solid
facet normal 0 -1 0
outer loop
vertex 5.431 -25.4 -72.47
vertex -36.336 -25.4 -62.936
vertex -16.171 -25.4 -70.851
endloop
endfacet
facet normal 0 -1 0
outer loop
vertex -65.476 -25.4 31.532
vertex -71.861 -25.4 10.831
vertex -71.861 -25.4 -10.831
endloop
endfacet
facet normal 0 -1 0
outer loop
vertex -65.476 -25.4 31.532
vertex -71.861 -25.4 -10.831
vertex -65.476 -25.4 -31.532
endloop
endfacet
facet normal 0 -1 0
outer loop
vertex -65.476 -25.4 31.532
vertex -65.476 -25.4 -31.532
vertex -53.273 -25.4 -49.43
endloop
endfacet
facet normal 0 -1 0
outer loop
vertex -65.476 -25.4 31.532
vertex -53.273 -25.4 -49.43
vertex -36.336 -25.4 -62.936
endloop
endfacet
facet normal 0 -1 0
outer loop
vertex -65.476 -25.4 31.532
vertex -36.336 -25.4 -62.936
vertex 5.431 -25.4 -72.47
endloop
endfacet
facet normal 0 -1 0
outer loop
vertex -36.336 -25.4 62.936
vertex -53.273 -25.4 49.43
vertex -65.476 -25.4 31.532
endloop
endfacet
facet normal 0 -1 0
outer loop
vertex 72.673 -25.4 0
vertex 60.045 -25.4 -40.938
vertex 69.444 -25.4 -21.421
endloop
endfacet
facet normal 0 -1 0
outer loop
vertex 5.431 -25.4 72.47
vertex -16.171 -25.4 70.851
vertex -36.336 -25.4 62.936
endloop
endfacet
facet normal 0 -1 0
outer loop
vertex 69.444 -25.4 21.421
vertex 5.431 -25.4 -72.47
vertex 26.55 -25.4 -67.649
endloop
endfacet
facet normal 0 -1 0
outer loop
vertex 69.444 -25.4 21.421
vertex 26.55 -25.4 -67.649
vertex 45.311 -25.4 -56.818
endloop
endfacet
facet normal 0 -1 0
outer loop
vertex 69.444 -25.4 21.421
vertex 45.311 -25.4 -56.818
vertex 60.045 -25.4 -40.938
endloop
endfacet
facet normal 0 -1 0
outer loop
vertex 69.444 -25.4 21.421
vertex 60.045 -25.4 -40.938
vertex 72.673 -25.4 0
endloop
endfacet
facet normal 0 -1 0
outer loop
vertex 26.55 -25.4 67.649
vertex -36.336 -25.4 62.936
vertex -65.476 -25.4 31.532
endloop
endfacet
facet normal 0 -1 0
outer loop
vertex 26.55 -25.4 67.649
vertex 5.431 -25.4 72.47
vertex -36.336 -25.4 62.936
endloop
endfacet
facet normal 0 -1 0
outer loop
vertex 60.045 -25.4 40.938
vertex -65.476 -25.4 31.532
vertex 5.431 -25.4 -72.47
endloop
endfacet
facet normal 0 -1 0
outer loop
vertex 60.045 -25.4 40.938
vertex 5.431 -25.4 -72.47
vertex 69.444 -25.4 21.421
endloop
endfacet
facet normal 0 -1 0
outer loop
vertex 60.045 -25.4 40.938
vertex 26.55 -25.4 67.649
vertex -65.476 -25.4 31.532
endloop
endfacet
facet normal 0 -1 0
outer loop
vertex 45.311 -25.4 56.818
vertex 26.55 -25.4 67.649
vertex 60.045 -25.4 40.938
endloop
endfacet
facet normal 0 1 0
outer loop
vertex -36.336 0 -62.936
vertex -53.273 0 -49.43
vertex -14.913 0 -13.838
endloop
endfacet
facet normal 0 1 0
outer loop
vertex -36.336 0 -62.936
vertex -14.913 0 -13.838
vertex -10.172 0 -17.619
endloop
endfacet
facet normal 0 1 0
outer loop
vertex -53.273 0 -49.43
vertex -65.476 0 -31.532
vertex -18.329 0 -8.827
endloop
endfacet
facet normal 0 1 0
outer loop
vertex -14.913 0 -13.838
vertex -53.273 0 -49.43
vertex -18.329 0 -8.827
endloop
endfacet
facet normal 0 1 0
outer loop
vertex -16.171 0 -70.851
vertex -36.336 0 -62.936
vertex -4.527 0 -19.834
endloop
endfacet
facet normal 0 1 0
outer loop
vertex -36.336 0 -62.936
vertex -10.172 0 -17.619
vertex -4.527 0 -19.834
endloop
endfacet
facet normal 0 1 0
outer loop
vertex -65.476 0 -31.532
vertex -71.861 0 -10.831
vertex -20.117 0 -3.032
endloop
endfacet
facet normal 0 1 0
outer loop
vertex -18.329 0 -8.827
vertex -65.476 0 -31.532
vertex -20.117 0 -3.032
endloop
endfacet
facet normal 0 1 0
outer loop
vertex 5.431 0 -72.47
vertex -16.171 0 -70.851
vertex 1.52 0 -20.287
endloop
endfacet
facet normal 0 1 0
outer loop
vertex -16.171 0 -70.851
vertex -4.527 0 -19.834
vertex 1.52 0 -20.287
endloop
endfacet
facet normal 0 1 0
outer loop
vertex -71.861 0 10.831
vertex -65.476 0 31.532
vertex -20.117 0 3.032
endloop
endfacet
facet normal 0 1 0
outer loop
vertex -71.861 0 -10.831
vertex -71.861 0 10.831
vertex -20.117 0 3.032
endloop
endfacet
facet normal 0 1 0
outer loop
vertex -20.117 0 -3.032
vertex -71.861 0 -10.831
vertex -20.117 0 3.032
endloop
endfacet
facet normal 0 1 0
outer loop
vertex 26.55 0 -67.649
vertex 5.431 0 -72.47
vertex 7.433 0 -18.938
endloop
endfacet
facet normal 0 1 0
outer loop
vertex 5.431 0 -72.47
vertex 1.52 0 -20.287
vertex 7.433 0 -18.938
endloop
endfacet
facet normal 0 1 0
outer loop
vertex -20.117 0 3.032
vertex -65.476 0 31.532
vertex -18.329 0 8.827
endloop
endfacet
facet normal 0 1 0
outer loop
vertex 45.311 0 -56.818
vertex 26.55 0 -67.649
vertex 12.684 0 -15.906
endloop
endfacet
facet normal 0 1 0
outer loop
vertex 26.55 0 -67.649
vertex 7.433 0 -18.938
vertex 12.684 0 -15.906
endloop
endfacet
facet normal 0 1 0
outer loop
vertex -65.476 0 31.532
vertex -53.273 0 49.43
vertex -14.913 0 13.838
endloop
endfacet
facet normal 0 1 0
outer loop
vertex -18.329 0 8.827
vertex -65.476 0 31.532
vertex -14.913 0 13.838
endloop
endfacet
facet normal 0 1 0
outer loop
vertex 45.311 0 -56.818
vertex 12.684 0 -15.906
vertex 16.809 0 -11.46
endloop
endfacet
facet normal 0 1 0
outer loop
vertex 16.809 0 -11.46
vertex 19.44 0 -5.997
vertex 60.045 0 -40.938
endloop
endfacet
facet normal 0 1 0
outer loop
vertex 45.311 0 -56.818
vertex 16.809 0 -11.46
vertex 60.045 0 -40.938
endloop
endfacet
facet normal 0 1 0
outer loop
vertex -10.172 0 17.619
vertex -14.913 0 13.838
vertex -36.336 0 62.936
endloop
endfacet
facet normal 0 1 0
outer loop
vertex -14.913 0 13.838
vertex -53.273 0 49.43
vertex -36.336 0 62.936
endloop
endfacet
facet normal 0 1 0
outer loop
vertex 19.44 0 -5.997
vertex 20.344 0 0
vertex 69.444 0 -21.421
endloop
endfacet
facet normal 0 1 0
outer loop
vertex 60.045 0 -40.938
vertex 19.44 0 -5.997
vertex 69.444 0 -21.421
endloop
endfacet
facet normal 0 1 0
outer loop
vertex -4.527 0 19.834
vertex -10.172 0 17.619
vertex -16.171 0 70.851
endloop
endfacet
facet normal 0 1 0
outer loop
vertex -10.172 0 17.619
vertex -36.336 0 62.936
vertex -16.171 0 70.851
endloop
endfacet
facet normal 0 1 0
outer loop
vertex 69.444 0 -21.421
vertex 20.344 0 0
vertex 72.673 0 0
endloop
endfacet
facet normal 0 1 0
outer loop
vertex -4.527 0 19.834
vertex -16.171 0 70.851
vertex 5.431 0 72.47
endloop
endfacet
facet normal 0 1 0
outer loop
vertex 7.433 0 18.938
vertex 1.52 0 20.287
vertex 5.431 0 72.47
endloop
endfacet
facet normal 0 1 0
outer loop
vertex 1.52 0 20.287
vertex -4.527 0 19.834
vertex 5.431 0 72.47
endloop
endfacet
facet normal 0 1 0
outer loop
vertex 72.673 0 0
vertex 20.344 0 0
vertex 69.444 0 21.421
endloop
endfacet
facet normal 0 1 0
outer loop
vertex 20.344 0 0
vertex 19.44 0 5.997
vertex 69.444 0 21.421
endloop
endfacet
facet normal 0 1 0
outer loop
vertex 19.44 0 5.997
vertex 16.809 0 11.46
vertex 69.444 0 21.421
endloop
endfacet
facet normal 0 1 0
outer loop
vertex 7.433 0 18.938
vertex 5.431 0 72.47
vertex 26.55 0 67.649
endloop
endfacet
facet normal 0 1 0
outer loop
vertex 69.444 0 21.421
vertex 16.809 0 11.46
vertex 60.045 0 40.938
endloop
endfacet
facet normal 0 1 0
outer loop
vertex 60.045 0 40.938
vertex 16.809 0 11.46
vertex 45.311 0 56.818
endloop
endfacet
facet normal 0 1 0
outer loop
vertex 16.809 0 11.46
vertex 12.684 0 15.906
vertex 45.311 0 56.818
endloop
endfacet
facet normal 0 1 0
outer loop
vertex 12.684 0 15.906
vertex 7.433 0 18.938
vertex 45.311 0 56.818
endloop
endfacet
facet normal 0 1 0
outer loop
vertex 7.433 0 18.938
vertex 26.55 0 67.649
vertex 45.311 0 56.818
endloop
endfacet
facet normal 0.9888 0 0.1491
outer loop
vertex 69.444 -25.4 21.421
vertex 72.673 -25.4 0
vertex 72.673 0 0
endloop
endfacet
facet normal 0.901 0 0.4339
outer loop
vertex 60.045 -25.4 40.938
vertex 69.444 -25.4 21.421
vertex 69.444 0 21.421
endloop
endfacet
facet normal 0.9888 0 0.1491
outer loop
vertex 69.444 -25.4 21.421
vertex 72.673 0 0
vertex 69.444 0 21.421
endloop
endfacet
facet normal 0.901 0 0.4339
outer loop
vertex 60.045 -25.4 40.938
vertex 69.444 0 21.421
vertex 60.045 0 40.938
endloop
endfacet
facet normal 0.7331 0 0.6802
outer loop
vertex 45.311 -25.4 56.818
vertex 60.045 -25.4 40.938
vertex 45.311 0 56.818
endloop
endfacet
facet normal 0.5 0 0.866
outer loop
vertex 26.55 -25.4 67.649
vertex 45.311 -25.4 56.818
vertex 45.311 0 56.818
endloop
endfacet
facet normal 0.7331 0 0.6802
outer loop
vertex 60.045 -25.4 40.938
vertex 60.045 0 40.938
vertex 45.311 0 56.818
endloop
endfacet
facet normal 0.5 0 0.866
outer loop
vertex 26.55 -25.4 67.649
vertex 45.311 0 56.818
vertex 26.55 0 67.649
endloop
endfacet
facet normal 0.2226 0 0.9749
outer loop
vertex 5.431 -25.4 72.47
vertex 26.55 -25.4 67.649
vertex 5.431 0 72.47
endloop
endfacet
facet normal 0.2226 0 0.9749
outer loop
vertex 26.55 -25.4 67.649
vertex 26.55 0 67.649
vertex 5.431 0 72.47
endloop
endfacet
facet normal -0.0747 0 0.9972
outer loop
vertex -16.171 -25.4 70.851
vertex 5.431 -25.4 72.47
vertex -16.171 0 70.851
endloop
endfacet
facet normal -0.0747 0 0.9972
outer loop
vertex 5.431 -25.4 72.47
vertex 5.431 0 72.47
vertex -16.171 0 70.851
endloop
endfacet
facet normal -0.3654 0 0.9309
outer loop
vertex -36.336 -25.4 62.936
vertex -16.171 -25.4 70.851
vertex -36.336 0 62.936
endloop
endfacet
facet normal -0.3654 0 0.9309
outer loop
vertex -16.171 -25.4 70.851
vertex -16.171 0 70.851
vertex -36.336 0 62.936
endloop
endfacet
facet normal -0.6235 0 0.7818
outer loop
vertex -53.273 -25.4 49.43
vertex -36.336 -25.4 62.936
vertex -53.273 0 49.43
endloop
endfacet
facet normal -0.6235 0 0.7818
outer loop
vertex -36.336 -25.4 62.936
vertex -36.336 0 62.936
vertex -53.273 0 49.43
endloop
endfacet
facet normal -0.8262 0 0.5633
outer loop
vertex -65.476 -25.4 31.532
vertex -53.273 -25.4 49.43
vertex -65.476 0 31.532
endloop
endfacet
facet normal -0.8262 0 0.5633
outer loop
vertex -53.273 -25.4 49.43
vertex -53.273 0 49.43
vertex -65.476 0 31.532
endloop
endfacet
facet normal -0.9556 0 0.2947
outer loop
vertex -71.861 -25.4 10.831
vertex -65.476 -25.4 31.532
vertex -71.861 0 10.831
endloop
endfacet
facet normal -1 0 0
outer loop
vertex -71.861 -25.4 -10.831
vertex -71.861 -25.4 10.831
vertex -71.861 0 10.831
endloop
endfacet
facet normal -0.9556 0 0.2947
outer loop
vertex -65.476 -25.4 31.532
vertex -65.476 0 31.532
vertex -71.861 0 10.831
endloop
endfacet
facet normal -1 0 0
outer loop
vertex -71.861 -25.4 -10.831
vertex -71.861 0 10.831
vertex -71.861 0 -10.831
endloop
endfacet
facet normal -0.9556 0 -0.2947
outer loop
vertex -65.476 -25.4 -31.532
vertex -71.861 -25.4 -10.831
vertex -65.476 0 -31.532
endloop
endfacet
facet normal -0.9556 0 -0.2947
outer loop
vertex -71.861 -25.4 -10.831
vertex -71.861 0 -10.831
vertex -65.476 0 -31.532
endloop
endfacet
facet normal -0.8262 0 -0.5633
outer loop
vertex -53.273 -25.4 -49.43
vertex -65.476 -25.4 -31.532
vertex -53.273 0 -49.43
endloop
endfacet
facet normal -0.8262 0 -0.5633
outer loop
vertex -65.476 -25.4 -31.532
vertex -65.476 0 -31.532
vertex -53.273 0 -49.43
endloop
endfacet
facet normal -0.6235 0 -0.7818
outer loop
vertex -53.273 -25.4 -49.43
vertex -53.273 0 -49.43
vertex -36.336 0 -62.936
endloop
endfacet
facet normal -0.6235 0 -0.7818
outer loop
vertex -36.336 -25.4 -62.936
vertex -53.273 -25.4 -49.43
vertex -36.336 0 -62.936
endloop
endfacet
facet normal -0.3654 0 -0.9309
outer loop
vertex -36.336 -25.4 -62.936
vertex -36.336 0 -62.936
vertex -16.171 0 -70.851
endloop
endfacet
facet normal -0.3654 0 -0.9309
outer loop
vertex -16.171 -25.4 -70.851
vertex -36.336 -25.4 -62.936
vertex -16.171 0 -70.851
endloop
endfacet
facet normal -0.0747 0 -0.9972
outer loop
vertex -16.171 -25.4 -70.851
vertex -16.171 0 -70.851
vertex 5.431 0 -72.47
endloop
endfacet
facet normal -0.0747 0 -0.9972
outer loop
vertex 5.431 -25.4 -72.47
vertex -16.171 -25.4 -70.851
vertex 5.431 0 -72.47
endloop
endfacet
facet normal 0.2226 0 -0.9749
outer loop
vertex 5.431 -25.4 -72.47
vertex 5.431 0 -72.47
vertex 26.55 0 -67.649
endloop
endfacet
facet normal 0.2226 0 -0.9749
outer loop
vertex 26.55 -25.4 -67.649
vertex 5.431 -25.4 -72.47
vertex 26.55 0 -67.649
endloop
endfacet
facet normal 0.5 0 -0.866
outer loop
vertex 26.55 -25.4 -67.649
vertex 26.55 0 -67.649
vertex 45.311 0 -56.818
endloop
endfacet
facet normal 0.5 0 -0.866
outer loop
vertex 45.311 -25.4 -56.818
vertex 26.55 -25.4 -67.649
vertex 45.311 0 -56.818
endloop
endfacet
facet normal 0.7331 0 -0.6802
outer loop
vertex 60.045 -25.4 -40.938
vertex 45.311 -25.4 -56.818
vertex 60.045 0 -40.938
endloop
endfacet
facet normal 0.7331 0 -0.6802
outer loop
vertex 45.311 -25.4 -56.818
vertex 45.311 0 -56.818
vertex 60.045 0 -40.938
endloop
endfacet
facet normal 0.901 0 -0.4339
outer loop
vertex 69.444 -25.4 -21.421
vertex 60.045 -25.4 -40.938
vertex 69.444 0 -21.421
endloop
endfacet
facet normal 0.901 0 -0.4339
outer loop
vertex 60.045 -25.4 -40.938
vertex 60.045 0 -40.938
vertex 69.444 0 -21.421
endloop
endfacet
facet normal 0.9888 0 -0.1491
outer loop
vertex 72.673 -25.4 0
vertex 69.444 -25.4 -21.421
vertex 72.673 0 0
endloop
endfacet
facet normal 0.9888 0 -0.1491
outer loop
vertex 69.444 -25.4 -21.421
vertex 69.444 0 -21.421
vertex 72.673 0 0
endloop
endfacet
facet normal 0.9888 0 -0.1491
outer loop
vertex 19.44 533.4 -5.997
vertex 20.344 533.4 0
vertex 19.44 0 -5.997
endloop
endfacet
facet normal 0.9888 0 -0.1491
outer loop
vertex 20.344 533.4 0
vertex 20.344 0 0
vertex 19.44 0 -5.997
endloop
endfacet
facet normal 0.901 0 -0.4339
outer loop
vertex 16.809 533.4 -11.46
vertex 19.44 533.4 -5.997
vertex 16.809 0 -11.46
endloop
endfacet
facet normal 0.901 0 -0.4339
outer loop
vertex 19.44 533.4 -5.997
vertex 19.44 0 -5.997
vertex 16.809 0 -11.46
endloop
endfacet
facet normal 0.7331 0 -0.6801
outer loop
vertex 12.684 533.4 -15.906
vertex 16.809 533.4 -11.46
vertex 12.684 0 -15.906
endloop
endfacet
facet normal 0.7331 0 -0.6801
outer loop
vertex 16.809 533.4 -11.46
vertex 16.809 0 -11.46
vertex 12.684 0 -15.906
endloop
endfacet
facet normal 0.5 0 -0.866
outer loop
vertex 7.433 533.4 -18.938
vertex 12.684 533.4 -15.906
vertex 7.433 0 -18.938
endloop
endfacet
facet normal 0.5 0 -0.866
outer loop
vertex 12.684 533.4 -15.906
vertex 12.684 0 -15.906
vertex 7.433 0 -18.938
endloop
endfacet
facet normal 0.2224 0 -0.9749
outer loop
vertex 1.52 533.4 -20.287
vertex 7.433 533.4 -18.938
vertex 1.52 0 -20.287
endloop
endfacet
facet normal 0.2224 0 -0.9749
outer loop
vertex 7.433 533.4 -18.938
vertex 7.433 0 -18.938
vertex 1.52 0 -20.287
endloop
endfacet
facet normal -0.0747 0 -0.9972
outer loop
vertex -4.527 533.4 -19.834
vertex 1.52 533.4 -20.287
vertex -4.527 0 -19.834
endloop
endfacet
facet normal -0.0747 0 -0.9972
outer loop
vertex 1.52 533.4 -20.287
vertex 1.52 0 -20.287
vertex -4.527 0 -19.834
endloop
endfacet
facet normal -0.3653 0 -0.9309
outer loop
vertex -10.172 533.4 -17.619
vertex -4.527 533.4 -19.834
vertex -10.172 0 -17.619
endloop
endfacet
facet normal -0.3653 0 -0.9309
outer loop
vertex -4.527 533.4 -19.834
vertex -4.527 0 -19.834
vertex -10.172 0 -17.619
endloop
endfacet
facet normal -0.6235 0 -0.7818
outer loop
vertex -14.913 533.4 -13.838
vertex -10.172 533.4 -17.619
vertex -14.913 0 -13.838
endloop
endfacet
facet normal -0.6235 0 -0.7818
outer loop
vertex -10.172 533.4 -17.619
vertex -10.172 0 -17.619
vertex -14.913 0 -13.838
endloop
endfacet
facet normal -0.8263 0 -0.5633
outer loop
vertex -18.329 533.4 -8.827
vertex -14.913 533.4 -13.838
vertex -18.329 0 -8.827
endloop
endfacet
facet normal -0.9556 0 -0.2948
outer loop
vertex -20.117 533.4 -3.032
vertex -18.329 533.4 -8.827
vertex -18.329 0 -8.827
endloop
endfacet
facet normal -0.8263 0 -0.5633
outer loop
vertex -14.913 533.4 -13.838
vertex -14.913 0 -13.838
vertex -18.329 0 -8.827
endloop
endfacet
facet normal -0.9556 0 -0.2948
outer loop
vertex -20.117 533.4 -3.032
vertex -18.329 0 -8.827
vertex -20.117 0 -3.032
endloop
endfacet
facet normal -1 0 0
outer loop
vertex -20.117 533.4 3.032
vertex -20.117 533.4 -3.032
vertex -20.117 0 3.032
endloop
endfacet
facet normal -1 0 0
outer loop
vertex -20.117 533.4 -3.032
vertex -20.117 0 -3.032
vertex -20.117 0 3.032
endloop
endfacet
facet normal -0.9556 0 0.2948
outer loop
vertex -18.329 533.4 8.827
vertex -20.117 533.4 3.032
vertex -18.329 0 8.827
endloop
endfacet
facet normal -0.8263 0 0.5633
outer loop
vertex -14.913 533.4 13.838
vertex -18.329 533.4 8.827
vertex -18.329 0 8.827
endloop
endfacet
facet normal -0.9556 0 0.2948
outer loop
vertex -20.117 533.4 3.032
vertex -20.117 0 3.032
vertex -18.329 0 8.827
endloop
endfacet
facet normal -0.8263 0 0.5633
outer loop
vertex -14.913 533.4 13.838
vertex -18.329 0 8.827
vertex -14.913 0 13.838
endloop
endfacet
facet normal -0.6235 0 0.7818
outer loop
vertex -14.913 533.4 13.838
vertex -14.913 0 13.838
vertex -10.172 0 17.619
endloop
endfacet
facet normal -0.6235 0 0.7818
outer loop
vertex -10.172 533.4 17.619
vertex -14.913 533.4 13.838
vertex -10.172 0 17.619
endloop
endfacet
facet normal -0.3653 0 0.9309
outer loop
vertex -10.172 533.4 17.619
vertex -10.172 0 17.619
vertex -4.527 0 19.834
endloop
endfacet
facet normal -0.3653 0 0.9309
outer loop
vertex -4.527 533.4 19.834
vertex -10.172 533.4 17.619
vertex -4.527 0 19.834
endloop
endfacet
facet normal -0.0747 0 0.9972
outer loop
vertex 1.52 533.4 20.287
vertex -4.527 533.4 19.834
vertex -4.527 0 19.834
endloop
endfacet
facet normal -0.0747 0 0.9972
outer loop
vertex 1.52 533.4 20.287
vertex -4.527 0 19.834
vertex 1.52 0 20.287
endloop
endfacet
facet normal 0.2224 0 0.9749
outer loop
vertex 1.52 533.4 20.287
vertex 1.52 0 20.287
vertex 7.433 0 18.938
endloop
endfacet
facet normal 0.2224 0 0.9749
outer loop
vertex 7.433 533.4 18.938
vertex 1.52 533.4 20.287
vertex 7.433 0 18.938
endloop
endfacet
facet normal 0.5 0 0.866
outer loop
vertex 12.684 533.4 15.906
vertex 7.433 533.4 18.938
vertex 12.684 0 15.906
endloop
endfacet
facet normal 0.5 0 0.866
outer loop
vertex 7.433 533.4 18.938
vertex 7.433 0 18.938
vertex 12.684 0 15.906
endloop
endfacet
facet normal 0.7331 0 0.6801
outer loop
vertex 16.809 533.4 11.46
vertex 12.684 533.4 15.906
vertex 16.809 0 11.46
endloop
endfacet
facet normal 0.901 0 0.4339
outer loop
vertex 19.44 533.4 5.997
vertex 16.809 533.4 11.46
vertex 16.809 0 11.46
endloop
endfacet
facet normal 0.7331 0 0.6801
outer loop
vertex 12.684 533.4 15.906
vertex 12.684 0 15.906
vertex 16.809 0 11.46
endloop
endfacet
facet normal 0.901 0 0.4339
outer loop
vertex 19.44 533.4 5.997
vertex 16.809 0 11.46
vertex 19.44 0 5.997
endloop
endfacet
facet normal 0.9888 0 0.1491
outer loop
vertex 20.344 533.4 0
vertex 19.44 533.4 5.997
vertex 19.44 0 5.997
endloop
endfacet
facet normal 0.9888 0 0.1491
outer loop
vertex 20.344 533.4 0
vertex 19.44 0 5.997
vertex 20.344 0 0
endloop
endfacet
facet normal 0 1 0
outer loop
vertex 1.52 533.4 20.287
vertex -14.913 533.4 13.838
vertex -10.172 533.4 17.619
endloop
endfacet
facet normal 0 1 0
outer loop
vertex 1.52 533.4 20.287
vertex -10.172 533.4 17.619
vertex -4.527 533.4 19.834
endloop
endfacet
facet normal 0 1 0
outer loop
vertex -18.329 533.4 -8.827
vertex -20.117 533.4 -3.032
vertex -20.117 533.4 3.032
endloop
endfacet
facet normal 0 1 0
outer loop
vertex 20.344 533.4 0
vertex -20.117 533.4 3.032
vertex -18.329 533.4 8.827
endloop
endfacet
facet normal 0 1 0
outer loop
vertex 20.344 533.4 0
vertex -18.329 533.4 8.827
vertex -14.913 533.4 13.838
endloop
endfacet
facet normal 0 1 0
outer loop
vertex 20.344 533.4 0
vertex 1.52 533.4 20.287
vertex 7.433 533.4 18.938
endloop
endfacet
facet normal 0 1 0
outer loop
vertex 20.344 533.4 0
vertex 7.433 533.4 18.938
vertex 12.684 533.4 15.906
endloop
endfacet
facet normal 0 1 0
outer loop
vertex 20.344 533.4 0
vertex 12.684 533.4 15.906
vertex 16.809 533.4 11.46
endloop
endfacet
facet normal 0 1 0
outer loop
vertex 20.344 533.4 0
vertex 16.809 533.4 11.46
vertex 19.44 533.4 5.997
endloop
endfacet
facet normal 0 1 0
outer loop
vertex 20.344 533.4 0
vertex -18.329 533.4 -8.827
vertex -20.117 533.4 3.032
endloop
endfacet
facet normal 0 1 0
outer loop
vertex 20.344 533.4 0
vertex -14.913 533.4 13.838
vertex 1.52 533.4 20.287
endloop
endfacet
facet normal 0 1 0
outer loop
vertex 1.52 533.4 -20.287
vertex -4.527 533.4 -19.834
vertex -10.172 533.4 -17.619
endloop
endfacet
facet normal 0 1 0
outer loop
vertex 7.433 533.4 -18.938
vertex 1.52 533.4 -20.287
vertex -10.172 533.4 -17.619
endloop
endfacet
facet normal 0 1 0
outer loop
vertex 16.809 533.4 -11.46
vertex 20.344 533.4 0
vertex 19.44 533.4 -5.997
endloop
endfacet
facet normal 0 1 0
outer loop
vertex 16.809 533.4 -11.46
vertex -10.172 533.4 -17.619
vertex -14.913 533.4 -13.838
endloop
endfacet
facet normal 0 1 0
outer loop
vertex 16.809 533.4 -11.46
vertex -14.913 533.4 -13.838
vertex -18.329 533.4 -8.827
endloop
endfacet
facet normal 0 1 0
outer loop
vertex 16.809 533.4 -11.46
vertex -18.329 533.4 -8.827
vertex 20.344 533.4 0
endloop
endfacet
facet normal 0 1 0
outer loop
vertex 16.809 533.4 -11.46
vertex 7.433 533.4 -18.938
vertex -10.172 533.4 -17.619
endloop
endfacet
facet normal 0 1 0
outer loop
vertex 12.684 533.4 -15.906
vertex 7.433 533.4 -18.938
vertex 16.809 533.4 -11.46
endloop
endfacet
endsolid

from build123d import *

# Parameters (mm, degrees)
F0_R      = 72.672804
F1_DEPTH  = 25.4
F2_R      = 20.344191
F3_DEPTH  = 508
F3_FACE_R = 20.344191
F4_DEPTH  = 25.4


with BuildPart() as f1:
    # F0 (on Front) → F1 (new body)
    with BuildSketch(Plane.XZ):
        Circle(F0_R)
    extrude(amount=F1_DEPTH)

    # F2 (on Front) → F3 (join)
    with BuildSketch(Plane.XZ):
        Circle(F2_R)
    extrude(amount=-F3_DEPTH)

    # F3_face (on face) → F4 (join)
    with BuildSketch(Plane(origin=(0, 508, 0), x_dir=(1, 0, 0), z_dir=(0, 1, 0))):
        Circle(F3_FACE_R)
    extrude(amount=F4_DEPTH)


solid = f1.part
